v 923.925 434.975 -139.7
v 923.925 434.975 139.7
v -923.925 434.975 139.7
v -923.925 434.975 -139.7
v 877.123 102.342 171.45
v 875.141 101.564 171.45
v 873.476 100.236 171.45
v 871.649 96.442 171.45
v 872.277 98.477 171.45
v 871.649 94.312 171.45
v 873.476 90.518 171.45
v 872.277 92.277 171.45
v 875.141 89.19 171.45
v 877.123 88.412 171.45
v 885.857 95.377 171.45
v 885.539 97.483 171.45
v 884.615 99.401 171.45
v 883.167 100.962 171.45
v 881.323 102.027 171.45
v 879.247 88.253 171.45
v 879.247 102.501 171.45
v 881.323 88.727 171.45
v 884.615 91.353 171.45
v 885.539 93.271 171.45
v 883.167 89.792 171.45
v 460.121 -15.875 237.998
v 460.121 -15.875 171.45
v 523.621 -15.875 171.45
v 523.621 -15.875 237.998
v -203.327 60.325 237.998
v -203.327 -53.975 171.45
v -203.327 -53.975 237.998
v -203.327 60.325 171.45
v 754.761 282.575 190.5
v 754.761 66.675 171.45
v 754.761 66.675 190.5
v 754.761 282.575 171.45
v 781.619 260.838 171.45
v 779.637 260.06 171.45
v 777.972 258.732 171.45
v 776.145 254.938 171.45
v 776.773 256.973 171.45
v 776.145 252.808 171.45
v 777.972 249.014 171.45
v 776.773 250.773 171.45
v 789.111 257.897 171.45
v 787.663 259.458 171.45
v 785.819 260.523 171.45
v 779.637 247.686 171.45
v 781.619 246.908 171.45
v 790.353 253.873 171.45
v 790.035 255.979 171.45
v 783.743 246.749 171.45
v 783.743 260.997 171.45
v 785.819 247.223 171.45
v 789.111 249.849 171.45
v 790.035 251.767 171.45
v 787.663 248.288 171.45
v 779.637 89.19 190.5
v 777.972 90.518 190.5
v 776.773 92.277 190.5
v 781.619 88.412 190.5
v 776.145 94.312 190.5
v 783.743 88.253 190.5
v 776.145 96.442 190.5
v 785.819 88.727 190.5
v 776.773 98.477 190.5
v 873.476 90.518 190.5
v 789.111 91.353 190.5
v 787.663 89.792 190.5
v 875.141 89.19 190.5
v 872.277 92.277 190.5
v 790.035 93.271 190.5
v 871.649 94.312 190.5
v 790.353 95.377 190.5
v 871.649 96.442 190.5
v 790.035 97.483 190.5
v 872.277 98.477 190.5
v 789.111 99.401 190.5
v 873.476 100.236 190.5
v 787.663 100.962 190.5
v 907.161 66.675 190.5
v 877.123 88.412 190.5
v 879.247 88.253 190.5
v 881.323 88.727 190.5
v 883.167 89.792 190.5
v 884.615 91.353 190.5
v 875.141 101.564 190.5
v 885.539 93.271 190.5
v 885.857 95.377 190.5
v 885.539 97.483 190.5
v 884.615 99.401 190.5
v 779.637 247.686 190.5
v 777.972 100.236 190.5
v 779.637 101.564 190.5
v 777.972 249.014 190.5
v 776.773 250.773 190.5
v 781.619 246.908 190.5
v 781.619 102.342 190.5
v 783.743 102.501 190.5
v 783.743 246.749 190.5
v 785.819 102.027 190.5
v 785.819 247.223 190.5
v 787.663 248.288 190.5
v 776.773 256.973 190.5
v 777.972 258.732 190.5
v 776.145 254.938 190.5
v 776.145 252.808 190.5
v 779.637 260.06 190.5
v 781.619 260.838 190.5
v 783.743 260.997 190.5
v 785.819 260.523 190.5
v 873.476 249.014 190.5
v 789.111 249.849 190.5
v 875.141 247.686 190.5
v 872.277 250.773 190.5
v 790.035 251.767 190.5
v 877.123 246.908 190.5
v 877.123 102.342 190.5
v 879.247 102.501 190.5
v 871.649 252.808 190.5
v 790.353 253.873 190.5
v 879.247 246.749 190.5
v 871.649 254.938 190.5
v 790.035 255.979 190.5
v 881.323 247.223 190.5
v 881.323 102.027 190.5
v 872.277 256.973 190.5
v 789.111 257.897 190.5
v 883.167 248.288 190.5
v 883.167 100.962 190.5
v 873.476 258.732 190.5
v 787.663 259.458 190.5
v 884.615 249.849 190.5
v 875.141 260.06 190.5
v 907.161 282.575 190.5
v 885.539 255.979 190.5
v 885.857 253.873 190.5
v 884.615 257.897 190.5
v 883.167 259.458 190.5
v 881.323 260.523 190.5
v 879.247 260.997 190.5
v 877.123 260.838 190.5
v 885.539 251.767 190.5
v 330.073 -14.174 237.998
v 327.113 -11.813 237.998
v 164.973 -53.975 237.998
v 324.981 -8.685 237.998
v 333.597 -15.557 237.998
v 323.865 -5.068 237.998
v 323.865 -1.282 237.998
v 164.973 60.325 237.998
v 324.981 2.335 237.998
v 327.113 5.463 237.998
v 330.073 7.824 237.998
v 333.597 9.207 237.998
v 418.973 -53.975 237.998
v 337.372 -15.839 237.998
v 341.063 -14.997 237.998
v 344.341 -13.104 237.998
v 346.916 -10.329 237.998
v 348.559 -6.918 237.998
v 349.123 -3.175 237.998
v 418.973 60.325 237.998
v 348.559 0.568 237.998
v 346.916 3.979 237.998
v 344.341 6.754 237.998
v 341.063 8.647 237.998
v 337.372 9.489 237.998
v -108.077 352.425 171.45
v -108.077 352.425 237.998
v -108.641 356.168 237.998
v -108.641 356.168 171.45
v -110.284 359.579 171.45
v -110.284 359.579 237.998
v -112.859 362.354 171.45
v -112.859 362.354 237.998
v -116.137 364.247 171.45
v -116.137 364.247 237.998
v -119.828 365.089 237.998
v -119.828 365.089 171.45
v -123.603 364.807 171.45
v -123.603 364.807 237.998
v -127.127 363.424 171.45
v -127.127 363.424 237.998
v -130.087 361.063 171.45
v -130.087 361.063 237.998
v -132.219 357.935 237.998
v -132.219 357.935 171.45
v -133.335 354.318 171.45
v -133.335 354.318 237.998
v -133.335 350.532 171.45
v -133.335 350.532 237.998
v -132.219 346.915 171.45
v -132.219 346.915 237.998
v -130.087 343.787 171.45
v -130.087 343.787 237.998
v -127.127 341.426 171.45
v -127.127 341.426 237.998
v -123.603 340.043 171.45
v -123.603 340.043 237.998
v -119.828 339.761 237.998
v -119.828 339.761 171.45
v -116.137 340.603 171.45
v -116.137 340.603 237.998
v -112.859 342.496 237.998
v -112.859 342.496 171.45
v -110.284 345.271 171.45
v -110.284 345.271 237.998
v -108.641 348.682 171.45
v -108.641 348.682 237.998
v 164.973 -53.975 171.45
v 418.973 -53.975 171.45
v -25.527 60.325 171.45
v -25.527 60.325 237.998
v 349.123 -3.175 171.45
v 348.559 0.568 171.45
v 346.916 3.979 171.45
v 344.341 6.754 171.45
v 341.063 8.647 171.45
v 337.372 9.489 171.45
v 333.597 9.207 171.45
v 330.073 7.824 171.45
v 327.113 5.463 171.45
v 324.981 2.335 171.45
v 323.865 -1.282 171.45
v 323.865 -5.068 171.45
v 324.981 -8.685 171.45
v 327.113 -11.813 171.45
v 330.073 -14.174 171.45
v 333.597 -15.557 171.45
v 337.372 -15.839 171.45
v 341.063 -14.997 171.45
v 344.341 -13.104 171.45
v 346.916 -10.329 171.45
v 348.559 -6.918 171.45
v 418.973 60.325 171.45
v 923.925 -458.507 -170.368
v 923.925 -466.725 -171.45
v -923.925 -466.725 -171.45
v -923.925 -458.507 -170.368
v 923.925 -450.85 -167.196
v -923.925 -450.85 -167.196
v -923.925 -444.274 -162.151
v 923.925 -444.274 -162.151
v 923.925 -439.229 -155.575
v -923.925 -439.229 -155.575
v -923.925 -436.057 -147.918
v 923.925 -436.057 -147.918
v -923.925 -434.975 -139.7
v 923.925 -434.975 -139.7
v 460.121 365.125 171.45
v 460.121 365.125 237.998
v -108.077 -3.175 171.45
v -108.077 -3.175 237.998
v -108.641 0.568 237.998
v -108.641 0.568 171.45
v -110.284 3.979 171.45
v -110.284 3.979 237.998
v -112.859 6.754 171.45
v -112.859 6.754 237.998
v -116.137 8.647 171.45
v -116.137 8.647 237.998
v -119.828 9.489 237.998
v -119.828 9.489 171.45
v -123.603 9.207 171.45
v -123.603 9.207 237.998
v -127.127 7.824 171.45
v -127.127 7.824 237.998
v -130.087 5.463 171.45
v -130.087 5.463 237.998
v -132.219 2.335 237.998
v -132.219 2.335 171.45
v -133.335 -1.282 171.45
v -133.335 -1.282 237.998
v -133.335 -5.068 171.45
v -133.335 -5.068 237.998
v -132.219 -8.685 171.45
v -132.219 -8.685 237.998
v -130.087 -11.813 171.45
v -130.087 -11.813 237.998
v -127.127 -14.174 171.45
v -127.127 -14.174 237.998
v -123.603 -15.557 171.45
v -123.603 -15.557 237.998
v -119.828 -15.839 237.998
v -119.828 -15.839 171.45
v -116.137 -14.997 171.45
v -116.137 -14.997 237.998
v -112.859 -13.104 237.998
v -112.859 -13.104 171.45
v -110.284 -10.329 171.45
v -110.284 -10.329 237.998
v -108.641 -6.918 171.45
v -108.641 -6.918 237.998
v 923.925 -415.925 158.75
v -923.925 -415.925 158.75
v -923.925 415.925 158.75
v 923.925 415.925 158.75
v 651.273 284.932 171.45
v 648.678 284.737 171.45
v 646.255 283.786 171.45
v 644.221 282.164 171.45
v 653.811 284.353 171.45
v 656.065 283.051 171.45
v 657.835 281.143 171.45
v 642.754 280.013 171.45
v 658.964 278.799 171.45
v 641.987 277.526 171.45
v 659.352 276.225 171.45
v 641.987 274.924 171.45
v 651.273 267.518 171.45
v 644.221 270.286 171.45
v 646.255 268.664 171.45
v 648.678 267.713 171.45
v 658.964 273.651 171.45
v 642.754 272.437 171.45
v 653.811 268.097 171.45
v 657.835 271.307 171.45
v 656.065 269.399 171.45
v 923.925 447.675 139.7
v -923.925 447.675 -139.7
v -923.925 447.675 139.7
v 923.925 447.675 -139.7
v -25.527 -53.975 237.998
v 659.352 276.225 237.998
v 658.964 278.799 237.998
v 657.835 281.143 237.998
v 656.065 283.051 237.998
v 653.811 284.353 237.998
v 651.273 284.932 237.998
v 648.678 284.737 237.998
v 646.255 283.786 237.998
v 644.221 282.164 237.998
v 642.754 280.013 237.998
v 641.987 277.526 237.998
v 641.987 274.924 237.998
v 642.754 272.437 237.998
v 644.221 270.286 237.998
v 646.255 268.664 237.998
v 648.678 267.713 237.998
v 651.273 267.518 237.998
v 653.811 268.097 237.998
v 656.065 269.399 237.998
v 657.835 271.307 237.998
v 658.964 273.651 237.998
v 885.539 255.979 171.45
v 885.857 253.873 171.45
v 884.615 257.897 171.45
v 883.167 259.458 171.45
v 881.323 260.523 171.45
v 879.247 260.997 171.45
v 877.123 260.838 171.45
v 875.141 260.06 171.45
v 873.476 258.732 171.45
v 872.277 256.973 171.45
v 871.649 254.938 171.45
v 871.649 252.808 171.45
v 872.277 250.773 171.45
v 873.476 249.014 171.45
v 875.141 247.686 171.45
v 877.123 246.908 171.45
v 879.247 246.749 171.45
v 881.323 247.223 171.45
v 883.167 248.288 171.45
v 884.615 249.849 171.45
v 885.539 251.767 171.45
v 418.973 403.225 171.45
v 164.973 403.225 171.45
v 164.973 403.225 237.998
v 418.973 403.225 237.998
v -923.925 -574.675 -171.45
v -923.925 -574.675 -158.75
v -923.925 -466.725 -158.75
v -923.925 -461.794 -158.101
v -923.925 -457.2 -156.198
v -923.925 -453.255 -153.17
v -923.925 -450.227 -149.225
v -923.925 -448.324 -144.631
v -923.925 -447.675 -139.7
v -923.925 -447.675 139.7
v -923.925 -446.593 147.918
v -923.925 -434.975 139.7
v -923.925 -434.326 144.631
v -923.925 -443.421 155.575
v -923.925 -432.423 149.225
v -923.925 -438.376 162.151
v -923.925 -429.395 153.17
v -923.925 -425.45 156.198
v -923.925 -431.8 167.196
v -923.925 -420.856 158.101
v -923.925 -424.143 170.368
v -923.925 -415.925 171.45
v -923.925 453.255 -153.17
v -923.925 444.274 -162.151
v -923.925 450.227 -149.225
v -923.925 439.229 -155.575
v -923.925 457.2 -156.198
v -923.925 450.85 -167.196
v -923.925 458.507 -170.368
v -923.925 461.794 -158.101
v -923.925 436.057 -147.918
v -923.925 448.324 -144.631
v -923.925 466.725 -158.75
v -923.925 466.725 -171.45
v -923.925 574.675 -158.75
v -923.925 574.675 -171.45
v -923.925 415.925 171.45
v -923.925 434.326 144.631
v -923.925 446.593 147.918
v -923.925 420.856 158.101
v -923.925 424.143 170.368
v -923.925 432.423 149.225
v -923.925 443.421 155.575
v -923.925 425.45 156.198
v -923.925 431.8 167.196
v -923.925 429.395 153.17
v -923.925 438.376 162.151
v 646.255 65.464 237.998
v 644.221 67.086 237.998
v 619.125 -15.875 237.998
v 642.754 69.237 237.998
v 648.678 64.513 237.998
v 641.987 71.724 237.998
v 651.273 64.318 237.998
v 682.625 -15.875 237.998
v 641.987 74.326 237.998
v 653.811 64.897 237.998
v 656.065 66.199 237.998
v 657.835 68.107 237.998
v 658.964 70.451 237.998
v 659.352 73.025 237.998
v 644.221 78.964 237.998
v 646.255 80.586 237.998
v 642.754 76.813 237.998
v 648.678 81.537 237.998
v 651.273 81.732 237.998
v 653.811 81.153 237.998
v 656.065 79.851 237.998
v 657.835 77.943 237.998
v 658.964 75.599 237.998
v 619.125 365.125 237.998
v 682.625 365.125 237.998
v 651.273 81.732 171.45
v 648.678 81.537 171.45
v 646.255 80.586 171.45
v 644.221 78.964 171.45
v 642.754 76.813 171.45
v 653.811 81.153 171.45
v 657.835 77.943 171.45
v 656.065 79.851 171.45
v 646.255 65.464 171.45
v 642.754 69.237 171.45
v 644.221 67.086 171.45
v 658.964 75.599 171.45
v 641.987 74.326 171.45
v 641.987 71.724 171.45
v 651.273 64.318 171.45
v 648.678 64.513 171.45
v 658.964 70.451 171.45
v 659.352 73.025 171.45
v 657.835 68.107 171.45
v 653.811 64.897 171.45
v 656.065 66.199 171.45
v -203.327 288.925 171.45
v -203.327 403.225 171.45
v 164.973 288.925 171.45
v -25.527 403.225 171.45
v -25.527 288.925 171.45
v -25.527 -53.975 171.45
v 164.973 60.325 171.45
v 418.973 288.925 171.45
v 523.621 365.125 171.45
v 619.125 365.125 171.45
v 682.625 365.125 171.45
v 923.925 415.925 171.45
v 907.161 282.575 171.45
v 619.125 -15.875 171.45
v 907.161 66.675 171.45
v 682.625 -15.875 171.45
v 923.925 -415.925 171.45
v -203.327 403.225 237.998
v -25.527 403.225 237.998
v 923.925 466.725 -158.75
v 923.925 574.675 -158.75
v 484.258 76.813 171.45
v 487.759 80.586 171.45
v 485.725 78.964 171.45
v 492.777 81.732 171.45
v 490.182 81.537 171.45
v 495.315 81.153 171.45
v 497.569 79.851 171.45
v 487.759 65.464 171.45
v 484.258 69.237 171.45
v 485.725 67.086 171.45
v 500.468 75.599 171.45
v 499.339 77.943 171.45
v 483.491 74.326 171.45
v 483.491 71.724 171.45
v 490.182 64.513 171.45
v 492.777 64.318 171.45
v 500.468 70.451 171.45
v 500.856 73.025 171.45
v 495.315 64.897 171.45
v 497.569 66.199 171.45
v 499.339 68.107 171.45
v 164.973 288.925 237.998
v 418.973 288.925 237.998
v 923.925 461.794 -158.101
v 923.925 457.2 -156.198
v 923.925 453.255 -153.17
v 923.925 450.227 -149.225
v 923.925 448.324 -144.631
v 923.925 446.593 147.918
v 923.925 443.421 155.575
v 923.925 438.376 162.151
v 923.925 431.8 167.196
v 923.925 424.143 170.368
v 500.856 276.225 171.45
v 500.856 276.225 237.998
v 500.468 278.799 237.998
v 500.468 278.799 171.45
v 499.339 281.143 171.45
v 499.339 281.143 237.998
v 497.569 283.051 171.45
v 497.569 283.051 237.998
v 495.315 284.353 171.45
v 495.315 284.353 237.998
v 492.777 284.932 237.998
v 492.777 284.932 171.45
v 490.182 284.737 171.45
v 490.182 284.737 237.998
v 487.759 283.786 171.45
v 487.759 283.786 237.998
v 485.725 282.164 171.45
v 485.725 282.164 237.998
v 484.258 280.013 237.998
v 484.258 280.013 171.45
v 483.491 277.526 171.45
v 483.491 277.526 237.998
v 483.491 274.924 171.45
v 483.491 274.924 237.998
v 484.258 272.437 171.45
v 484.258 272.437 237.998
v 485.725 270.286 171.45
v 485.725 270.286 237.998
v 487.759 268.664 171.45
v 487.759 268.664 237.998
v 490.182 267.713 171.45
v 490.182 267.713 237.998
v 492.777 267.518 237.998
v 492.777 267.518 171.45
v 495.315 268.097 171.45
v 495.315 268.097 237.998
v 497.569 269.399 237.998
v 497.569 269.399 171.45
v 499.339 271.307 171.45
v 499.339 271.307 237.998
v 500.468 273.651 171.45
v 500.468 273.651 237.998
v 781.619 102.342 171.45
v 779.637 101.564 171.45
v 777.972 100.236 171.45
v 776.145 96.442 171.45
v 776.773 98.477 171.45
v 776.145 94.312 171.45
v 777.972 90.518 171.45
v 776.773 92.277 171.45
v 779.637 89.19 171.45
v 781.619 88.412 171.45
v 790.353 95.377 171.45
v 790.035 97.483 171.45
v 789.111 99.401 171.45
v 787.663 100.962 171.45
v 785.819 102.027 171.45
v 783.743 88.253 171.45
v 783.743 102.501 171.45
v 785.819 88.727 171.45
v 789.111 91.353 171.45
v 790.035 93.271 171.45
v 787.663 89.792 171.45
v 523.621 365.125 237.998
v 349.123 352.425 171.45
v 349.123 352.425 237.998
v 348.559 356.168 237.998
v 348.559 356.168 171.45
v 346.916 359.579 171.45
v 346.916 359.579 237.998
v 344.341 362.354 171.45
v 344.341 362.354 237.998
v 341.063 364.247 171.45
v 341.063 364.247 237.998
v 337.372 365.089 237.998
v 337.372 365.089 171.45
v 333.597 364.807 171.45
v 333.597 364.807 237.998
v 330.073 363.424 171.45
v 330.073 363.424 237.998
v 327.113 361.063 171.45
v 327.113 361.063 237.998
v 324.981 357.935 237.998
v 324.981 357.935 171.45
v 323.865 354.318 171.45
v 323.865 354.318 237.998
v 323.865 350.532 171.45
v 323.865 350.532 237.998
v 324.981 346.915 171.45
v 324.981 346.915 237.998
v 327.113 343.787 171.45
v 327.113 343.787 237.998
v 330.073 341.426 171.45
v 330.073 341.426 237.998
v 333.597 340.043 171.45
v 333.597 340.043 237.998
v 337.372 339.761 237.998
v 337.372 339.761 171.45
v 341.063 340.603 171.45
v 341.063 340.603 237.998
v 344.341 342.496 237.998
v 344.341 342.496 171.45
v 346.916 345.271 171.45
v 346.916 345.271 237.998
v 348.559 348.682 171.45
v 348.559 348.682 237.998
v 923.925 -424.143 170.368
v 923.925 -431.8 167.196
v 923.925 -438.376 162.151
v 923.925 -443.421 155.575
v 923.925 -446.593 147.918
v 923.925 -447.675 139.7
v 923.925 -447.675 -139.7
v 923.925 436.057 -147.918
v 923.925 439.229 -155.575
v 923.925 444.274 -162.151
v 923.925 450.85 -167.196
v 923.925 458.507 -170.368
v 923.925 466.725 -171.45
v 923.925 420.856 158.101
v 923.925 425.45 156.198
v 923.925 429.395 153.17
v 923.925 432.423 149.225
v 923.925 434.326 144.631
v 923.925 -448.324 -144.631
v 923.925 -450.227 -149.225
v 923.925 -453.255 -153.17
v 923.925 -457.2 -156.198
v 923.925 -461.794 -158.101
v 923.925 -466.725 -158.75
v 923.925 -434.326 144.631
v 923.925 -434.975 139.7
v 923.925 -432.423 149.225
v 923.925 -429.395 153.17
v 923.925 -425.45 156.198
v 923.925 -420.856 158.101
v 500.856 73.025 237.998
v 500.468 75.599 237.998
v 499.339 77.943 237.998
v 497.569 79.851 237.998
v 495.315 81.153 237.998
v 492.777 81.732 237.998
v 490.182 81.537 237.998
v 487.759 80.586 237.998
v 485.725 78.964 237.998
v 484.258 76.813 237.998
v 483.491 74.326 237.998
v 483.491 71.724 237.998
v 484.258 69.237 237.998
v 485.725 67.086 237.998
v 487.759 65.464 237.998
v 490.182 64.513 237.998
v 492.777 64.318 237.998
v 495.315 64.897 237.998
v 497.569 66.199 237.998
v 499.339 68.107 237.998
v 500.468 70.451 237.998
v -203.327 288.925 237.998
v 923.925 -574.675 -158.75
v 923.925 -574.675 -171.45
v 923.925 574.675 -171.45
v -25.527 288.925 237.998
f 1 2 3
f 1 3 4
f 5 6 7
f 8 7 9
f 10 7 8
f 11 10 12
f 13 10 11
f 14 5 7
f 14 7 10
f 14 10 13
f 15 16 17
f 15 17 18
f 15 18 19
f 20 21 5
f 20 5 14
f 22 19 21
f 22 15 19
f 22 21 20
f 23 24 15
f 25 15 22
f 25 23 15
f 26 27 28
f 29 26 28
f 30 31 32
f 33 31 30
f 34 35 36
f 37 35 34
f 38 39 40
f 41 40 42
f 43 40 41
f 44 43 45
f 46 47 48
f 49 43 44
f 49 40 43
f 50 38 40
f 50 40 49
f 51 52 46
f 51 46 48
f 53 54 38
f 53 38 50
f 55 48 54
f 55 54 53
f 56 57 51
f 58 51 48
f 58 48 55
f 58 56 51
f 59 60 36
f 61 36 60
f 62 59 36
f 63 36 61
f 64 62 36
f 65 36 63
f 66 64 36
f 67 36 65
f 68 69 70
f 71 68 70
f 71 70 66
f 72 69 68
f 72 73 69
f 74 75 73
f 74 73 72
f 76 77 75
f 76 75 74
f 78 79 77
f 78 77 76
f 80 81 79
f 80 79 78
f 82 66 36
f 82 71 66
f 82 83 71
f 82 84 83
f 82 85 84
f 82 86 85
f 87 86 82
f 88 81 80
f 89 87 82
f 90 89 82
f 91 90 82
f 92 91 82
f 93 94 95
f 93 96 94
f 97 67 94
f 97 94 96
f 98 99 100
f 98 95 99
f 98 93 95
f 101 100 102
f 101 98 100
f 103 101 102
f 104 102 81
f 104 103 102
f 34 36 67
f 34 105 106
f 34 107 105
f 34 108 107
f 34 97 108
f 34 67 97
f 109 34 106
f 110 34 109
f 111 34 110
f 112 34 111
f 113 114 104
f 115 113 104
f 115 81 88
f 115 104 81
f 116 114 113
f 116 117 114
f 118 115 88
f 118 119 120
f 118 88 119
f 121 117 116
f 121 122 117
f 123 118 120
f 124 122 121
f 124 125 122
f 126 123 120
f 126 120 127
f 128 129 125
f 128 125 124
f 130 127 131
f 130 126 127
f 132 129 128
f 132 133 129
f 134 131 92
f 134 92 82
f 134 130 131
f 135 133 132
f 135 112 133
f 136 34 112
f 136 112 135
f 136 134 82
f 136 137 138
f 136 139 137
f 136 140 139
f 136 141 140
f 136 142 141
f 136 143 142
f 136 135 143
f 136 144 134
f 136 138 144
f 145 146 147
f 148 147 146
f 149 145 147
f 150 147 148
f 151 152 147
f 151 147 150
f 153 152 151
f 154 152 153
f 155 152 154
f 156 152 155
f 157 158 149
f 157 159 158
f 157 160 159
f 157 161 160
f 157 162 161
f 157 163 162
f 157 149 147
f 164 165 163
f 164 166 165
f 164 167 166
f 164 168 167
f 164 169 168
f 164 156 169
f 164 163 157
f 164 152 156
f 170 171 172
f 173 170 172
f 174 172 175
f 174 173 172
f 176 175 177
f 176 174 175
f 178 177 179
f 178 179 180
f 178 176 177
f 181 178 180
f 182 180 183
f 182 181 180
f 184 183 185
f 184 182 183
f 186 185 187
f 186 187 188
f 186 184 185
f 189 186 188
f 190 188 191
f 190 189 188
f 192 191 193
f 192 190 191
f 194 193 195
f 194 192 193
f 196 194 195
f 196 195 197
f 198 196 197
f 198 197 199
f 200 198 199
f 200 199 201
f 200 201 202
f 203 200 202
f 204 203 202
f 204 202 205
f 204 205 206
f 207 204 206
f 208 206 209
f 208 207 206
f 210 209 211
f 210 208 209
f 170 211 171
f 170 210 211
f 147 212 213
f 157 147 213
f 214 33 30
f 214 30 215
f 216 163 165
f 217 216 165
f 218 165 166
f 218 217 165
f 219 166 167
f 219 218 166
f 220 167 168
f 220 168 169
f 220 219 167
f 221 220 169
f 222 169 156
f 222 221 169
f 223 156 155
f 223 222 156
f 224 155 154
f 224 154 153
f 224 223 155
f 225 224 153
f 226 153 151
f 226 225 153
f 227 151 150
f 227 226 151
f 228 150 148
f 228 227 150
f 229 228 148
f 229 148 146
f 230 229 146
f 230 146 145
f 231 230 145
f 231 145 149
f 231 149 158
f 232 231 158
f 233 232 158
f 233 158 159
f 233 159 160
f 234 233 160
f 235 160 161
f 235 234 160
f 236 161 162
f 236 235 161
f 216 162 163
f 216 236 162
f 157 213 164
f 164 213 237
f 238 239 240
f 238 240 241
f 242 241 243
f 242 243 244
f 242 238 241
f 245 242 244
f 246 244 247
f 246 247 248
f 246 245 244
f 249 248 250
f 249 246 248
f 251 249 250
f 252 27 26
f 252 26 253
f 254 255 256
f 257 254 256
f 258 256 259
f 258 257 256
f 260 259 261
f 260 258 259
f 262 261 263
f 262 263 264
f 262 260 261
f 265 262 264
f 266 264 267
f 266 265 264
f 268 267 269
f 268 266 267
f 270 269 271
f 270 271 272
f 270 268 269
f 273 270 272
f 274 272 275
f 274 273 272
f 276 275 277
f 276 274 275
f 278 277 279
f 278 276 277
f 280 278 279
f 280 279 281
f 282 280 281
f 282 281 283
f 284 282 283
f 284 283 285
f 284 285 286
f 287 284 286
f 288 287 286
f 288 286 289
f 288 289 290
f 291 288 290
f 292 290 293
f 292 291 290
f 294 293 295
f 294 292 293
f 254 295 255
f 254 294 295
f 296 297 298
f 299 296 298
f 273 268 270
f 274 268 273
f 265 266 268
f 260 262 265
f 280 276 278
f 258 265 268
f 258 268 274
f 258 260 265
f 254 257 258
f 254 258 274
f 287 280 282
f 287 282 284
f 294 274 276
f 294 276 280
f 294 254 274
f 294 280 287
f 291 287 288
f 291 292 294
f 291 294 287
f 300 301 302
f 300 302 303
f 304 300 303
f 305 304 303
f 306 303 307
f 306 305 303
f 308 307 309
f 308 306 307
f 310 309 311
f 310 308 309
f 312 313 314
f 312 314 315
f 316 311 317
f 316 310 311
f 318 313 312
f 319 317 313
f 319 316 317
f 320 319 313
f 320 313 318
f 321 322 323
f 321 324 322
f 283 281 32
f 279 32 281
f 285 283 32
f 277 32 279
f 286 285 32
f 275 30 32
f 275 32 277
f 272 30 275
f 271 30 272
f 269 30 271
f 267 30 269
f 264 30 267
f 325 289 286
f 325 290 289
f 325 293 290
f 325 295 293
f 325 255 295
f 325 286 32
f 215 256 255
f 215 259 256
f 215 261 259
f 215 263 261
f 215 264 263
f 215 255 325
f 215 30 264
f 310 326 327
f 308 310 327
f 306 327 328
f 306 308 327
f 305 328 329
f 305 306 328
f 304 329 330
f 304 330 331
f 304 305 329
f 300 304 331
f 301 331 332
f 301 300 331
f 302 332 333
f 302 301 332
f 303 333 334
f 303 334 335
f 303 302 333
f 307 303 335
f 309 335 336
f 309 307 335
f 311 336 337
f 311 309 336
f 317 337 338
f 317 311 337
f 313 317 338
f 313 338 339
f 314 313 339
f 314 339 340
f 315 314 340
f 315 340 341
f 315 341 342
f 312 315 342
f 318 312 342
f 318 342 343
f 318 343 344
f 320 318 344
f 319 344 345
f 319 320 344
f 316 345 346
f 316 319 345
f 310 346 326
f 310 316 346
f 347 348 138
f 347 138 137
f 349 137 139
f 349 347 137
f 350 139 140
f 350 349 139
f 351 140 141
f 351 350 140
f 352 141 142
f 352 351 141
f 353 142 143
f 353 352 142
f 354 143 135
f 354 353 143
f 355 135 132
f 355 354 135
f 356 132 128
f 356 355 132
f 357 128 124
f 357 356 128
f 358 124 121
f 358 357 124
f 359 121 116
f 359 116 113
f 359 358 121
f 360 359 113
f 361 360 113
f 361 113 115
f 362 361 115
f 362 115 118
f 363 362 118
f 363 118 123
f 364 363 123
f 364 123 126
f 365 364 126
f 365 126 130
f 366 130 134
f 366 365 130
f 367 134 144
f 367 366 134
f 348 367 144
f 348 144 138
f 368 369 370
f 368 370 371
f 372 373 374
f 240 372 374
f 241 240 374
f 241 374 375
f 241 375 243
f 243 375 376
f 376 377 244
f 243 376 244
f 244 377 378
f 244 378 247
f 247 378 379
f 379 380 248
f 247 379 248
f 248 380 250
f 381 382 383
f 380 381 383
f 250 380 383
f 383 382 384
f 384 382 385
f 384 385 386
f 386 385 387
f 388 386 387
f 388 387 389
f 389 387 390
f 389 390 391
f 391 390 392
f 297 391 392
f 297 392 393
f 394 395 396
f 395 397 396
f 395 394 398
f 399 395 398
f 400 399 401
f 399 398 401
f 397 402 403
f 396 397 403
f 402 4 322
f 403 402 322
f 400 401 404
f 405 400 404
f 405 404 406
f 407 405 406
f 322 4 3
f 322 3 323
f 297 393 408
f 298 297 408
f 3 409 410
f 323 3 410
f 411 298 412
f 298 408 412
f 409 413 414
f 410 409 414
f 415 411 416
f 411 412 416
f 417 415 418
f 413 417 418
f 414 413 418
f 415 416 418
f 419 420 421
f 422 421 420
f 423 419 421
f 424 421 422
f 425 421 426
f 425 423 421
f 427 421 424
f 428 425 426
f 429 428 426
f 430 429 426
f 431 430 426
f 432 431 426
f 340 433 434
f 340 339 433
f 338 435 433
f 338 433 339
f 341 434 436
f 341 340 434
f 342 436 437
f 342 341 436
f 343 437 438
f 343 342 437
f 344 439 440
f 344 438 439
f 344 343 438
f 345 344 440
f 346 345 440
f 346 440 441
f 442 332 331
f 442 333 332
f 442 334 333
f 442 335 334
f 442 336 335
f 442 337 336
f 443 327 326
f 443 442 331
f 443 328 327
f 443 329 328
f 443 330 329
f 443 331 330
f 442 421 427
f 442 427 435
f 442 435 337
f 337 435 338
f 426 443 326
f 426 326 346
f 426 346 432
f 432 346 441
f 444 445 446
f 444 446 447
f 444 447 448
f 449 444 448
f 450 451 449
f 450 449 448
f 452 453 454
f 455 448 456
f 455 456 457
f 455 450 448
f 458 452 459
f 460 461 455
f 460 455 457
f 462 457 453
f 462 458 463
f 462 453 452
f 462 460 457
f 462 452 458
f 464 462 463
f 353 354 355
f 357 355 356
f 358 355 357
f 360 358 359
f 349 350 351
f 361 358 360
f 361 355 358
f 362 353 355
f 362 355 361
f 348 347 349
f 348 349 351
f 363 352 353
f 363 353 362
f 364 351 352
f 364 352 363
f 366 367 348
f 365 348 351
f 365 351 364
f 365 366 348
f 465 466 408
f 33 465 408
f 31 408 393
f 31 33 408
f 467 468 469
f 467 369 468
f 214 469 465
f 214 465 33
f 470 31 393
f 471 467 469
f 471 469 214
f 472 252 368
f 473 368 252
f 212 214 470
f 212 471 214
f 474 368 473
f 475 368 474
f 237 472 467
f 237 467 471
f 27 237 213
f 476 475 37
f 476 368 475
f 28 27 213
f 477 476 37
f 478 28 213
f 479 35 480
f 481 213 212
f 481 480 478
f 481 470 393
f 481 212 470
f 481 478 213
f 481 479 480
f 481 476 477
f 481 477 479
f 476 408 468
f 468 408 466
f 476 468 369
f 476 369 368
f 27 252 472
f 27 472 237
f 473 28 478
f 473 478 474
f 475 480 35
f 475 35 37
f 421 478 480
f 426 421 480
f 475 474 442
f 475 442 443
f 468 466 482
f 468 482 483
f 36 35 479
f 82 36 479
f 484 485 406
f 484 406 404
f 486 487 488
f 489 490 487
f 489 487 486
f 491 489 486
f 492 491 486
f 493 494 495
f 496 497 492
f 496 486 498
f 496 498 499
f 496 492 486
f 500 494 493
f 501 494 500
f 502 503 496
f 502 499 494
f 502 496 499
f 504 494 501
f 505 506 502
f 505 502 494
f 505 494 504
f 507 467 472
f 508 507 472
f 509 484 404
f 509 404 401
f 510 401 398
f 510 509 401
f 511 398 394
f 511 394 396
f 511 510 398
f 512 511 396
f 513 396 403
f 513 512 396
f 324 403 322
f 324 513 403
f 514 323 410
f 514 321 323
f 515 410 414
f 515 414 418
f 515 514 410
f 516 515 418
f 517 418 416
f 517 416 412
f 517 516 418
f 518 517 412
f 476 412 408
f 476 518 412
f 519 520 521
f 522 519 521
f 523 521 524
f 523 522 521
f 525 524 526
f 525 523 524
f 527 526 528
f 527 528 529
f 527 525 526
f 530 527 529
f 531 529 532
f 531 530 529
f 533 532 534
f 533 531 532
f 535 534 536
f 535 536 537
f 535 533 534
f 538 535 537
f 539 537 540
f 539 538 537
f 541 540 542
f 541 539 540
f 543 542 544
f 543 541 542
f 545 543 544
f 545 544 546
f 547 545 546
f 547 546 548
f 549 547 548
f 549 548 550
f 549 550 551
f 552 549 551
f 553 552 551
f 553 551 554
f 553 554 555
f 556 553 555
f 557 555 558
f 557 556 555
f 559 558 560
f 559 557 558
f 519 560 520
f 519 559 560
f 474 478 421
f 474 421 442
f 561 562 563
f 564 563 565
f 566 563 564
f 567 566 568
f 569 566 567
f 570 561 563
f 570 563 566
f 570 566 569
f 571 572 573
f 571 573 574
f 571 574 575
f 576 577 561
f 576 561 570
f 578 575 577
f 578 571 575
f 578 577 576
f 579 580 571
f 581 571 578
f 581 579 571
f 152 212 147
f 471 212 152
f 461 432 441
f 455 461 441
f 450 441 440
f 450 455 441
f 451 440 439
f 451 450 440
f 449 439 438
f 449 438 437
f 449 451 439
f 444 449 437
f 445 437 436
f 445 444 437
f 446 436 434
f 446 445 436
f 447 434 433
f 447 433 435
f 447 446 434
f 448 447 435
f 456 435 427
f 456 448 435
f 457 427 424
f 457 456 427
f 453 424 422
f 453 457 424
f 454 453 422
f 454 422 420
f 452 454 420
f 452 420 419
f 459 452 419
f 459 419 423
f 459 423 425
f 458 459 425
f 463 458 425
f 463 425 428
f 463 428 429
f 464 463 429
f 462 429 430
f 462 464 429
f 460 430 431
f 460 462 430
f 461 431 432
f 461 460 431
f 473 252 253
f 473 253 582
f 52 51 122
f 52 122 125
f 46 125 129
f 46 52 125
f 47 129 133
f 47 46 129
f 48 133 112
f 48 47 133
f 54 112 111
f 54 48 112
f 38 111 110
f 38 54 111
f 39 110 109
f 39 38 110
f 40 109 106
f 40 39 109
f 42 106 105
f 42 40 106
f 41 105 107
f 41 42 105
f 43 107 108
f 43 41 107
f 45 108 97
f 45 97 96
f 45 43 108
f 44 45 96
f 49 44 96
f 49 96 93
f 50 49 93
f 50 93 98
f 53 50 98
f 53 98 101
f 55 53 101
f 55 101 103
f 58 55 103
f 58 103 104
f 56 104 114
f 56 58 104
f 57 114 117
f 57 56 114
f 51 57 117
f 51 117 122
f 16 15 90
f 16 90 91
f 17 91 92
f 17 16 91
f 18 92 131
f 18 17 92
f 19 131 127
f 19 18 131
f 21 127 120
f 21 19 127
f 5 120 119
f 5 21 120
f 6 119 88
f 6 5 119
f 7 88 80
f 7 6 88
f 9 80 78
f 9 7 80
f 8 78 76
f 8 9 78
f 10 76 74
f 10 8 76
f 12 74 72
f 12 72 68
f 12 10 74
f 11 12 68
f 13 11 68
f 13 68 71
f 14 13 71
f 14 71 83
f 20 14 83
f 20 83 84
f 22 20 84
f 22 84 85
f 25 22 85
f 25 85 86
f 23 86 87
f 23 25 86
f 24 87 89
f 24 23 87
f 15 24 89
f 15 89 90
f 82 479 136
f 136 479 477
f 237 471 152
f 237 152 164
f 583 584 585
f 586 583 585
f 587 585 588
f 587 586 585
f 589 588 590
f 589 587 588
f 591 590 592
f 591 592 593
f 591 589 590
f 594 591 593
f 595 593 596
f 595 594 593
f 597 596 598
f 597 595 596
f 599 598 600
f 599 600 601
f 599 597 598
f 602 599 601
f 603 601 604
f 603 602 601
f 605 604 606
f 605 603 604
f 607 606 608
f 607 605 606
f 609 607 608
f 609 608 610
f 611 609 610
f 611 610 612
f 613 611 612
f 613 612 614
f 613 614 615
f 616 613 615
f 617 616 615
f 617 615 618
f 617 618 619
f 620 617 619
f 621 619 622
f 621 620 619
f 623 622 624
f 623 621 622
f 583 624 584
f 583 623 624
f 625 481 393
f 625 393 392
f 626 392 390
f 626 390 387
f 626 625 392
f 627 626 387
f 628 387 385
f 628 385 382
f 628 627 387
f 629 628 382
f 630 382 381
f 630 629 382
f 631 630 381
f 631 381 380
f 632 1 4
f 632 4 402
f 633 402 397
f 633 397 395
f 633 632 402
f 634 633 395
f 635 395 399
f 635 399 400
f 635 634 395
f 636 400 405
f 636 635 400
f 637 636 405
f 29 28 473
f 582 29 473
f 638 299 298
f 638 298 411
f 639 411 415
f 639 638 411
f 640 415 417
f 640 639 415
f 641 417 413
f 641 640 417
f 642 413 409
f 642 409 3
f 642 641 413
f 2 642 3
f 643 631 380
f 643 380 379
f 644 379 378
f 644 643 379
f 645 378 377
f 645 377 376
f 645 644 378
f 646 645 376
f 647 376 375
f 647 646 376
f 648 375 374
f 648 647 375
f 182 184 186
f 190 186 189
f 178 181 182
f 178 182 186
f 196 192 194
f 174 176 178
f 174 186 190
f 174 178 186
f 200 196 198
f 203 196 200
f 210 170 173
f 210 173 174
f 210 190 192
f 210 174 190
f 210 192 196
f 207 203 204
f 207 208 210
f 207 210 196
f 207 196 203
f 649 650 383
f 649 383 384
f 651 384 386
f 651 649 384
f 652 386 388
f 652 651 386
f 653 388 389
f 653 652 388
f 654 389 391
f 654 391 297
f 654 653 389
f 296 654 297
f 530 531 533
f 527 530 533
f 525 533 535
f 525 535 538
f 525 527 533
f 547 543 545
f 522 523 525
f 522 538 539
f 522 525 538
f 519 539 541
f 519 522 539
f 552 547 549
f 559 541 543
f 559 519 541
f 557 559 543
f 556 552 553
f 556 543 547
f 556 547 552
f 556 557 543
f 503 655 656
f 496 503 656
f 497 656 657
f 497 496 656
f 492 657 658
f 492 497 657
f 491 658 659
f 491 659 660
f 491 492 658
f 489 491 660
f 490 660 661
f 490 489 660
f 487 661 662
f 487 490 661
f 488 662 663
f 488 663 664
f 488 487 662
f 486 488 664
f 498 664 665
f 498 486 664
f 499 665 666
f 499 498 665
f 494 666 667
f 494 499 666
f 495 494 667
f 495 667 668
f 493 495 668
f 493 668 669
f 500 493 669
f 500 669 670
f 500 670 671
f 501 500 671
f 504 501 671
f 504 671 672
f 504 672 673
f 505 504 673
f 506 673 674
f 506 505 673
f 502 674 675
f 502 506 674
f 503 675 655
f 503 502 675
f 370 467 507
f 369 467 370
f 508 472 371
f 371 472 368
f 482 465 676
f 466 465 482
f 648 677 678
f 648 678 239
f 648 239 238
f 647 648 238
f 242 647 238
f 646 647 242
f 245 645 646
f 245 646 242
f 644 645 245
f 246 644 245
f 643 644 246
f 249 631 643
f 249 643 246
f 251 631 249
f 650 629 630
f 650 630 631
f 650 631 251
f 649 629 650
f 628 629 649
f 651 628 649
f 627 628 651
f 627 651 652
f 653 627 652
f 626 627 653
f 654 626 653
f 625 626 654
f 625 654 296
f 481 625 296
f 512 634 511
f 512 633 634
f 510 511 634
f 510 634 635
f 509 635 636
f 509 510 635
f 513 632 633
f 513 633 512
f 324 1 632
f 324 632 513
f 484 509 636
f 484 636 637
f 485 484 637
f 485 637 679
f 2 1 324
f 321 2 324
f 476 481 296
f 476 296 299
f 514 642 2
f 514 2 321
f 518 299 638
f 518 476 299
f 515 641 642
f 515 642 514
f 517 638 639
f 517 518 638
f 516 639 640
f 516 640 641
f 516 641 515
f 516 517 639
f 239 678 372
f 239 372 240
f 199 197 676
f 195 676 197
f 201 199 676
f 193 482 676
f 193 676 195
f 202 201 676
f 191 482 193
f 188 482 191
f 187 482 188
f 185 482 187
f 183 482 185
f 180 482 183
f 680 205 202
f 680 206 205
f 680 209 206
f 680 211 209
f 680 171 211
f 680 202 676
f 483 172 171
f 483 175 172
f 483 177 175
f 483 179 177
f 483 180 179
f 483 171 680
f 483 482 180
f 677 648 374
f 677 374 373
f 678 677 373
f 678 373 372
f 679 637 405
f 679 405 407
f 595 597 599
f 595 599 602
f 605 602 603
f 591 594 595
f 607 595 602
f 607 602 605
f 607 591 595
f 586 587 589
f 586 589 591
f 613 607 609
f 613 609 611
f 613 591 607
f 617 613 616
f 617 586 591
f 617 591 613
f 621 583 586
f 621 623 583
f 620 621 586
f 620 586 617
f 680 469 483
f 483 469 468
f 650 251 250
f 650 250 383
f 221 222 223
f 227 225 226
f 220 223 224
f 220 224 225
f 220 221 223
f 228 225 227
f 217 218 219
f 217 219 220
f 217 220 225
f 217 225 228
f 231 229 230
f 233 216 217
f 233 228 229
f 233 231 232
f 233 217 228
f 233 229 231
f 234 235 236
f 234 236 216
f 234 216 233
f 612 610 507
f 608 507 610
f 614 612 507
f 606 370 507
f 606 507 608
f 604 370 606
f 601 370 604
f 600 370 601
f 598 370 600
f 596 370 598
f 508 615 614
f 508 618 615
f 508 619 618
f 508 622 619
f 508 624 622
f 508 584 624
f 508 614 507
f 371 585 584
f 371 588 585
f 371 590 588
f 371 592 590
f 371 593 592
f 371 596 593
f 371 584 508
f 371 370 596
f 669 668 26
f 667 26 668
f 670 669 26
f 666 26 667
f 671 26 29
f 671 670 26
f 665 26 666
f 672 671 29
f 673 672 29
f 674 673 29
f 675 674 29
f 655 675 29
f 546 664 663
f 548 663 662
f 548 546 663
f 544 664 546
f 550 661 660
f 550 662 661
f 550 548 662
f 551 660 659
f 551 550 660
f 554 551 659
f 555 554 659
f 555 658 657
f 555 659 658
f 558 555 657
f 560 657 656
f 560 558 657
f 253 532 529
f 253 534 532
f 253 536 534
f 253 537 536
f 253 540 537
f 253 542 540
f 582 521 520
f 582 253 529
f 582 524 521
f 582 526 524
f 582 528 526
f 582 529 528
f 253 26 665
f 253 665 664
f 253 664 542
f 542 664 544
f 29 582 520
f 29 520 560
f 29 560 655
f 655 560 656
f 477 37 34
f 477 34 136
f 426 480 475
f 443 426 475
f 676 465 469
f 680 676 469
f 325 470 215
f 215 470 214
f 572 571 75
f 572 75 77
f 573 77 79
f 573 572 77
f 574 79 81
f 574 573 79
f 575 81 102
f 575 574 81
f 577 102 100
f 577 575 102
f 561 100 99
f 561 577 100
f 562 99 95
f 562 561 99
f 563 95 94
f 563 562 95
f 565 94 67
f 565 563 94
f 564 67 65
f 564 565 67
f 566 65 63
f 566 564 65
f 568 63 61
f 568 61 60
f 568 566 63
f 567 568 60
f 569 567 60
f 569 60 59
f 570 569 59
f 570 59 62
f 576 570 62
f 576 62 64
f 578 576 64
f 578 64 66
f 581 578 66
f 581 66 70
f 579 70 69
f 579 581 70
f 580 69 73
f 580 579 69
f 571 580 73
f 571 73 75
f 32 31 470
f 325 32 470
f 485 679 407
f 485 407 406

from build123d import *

# Parameters (mm, degrees)
F1_DEPTH = 923.925
F2_W     = 152.4
F2_H     = 215.9
F2_R     = 7.14375
F3_DEPTH = 19.05
F4_W     = 63.5
F4_H     = 381
F4_R     = 8.73125
F5_DEPTH = 66.548
F6_W     = 177.8
F6_H     = 114.3
F6_R     = 12.7
F6_W_2   = 254
F7_DEPTH = 66.548


with BuildPart() as f1:
    # F0 (on Right) → F1 (new body, symmetric)
    with BuildSketch(Plane.YZ):
        with BuildLine():
            Line((415.925, 171.45), (-415.925, 171.45))
            ThreePointArc((-415.925, 171.45), (-438.37564, 162.15064), (-447.675, 139.7))
            Line((-447.675, 139.7), (-447.675, -139.7))
            ThreePointArc((-447.675, -139.7), (-453.254616, -153.170384), (-466.725, -158.75))
            Line((-466.725, -158.75), (-574.675, -158.75))
            Line((-574.675, -158.75), (-574.675, -171.45))
            Line((-574.675, -171.45), (-466.725, -171.45))
            ThreePointArc((-466.725, -171.45), (-444.27436, -162.15064), (-434.975, -139.7))
            Line((-434.975, -139.7), (-434.975, 139.7))
            ThreePointArc((-434.975, 139.7), (-429.395384, 153.170384), (-415.925, 158.75))
            Line((-415.925, 158.75), (415.925, 158.75))
            ThreePointArc((415.925, 158.75), (429.395384, 153.170384), (434.975, 139.7))
            Line((434.975, 139.7), (434.975, -139.7))
            ThreePointArc((434.975, -139.7), (444.27436, -162.15064), (466.725, -171.45))
            Line((466.725, -171.45), (574.675, -171.45))
            Line((574.675, -171.45), (574.675, -158.75))
            Line((574.675, -158.75), (466.725, -158.75))
            ThreePointArc((466.725, -158.75), (453.254616, -153.170384), (447.675, -139.7))
            Line((447.675, -139.7), (447.675, 139.7))
            ThreePointArc((447.675, 139.7), (438.37564, 162.15064), (415.925, 171.45))
        make_face()
    extrude(amount=F1_DEPTH, both=True)

    # F2 (on face) → F3 (join)
    with BuildSketch(Plane.XY.offset(171.45)):
        with Locations((830.961, 174.625)):
            Rectangle(F2_W, F2_H)
        with Locations((783.209, 95.377)):
            Circle(F2_R, mode=Mode.SUBTRACT)
        with Locations((878.713, 95.377)):
            Circle(F2_R, mode=Mode.SUBTRACT)
        with Locations((783.209, 253.873)):
            Circle(F2_R, mode=Mode.SUBTRACT)
        with Locations((878.713, 253.873)):
            Circle(F2_R, mode=Mode.SUBTRACT)
    extrude(amount=F3_DEPTH)

    # F4 (on face) → F5 (join)
    with BuildSketch(Plane.XY.offset(171.45)):
        with Locations((491.871, 174.625)):
            Rectangle(F4_W, F4_H)
        with Locations((492.125, 73.025)):
            Circle(F4_R, mode=Mode.SUBTRACT)
        with Locations((492.125, 276.225)):
            Circle(F4_R, mode=Mode.SUBTRACT)
        with Locations((650.875, 174.625)):
            Rectangle(F4_W, F4_H)
        with Locations((650.621, 73.025)):
            Circle(F4_R, mode=Mode.SUBTRACT)
        with Locations((650.621, 276.225)):
            Circle(F4_R, mode=Mode.SUBTRACT)
    extrude(amount=F5_DEPTH)

    # F6 (on face) → F7 (join)
    with BuildSketch(Plane.XY.offset(171.45)):
        with Locations((-114.427, 3.175)):
            Rectangle(F6_W, F6_H)
        with Locations((-120.777, -3.175)):
            Circle(F6_R, mode=Mode.SUBTRACT)
        with Locations((291.973, 3.175)):
            Rectangle(F6_W_2, F6_H)
        with Locations((336.423, -3.175)):
            Circle(F6_R, mode=Mode.SUBTRACT)
        with Locations((-114.427, 346.075)):
            Rectangle(F6_W, F6_H)
        with Locations((-120.777, 352.425)):
            Circle(F6_R, mode=Mode.SUBTRACT)
        with Locations((291.973, 346.075)):
            Rectangle(F6_W_2, F6_H)
        with Locations((336.423, 352.425)):
            Circle(F6_R, mode=Mode.SUBTRACT)
    extrude(amount=F7_DEPTH)


solid = f1.part
